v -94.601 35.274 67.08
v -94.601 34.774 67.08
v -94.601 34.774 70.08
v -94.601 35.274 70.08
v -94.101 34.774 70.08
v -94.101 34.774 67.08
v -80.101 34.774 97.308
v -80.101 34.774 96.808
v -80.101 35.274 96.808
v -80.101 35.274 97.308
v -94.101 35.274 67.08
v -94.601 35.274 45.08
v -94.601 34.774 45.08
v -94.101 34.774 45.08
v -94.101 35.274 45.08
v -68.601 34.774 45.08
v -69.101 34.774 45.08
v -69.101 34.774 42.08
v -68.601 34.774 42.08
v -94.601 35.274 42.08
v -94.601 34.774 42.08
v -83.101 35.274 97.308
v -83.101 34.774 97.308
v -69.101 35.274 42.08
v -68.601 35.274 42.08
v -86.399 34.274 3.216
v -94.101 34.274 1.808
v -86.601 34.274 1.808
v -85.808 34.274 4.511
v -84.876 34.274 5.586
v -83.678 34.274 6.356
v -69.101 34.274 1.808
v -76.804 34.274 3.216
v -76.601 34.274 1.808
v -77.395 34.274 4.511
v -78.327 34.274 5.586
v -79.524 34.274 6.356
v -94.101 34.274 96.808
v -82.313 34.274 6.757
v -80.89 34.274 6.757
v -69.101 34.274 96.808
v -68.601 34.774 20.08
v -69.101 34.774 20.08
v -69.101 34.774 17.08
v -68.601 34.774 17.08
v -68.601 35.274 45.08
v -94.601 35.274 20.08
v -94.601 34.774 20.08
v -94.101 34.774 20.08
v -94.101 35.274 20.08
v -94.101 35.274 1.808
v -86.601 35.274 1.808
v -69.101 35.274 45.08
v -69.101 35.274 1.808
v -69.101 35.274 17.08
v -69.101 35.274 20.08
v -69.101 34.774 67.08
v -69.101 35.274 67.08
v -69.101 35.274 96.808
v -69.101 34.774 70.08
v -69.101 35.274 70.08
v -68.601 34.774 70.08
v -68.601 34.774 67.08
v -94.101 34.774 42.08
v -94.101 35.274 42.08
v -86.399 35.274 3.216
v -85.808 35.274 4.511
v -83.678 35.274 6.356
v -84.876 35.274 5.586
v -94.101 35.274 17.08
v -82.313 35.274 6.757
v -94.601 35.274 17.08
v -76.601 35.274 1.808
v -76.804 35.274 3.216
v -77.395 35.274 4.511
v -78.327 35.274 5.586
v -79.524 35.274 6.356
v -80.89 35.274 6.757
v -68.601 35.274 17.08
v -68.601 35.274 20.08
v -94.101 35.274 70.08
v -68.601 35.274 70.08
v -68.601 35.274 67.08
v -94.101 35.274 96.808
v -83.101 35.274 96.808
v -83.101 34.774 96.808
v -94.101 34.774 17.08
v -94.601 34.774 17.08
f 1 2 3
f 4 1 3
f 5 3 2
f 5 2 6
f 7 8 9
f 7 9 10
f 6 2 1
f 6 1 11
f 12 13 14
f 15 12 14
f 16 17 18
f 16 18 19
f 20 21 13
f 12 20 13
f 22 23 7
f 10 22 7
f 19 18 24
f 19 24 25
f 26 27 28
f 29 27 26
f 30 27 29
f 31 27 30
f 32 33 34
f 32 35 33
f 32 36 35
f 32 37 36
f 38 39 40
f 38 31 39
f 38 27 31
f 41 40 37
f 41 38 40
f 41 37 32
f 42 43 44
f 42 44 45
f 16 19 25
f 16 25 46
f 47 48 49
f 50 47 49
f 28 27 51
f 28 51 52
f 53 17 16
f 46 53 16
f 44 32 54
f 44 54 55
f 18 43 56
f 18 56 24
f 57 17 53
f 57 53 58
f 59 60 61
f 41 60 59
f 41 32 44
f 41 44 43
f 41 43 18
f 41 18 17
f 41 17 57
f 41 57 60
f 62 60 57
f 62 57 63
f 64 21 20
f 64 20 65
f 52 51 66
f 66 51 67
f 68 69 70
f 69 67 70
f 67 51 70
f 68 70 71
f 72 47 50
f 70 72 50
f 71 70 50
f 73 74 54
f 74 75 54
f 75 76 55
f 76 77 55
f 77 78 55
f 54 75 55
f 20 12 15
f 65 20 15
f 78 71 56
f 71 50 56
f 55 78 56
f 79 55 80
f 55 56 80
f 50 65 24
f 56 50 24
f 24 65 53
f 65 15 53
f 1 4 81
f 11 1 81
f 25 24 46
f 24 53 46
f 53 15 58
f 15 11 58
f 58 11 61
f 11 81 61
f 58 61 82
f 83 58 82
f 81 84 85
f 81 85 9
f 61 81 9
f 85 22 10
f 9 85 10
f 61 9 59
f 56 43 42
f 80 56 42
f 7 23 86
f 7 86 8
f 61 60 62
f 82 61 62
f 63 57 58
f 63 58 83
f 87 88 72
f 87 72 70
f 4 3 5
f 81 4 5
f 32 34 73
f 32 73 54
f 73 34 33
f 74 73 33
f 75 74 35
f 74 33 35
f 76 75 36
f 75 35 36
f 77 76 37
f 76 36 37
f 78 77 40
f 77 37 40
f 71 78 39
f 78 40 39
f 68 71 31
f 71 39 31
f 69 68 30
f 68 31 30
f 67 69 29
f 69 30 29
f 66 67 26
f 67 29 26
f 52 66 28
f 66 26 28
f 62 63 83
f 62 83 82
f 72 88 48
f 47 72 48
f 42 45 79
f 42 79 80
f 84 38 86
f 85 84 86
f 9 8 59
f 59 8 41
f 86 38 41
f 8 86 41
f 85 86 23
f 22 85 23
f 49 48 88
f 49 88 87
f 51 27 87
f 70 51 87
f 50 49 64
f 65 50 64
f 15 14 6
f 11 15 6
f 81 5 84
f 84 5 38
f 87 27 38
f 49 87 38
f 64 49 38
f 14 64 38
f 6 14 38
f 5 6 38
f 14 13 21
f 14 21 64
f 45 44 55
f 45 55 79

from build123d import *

# Parameters (mm, degrees)
SKETCH1_W           = 25
SKETCH1_H           = 95
BOSS_EXTRUDE1_DEPTH = 1
BOSS_EXTRUDE2_START = -0.5
SKETCH3_W           = 3
SKETCH3_H           = 1
SKETCH3_W_2         = 1
SKETCH3_H_2         = 3
BOSS_EXTRUDE2_DEPTH = 0.5
SKETCH4_R           = 5
CUT_EXTRUDE1_DEPTH  = 1


with BuildPart() as part:
    # Sketch1 → Boss-Extrude1 (new body)
    with BuildSketch(Plane.XZ.offset(-34.2740501)):
        with Locations((-81.601257217, 49.307503177)):
            Rectangle(SKETCH1_W, SKETCH1_H)
    extrude(amount=-BOSS_EXTRUDE1_DEPTH)

    # Sketch3 → Boss-Extrude2 (add)
    with BuildSketch(Plane.XZ.offset(-34.2740501).offset(BOSS_EXTRUDE2_START)):
        with Locations((-81.601257217, 96.807503177)):
            Rectangle(SKETCH3_W, SKETCH3_H)
        with Locations((-94.101257217, 68.580262086)):
            Rectangle(SKETCH3_W_2, SKETCH3_H_2)
        with Locations((-94.101257217, 43.580262086)):
            Rectangle(SKETCH3_W_2, SKETCH3_H_2)
        with Locations((-94.101257217, 18.580262086)):
            Rectangle(SKETCH3_W_2, SKETCH3_H_2)
        with Locations((-69.101257217, 18.580262086)):
            Rectangle(SKETCH3_W_2, SKETCH3_H_2)
        with Locations((-69.101257217, 43.580262086)):
            Rectangle(SKETCH3_W_2, SKETCH3_H_2)
        with Locations((-69.101257217, 68.580262086)):
            Rectangle(SKETCH3_W_2, SKETCH3_H_2)
    extrude(amount=-BOSS_EXTRUDE2_DEPTH)

    # Sketch4 → Cut-Extrude1 (cut)
    with BuildSketch(Plane.XZ.offset(-34.2740501)):
        with Locations((-81.601257217, 1.807503177)):
            Circle(SKETCH4_R)
    extrude(amount=-CUT_EXTRUDE1_DEPTH, mode=Mode.SUBTRACT)


solid = part.part
